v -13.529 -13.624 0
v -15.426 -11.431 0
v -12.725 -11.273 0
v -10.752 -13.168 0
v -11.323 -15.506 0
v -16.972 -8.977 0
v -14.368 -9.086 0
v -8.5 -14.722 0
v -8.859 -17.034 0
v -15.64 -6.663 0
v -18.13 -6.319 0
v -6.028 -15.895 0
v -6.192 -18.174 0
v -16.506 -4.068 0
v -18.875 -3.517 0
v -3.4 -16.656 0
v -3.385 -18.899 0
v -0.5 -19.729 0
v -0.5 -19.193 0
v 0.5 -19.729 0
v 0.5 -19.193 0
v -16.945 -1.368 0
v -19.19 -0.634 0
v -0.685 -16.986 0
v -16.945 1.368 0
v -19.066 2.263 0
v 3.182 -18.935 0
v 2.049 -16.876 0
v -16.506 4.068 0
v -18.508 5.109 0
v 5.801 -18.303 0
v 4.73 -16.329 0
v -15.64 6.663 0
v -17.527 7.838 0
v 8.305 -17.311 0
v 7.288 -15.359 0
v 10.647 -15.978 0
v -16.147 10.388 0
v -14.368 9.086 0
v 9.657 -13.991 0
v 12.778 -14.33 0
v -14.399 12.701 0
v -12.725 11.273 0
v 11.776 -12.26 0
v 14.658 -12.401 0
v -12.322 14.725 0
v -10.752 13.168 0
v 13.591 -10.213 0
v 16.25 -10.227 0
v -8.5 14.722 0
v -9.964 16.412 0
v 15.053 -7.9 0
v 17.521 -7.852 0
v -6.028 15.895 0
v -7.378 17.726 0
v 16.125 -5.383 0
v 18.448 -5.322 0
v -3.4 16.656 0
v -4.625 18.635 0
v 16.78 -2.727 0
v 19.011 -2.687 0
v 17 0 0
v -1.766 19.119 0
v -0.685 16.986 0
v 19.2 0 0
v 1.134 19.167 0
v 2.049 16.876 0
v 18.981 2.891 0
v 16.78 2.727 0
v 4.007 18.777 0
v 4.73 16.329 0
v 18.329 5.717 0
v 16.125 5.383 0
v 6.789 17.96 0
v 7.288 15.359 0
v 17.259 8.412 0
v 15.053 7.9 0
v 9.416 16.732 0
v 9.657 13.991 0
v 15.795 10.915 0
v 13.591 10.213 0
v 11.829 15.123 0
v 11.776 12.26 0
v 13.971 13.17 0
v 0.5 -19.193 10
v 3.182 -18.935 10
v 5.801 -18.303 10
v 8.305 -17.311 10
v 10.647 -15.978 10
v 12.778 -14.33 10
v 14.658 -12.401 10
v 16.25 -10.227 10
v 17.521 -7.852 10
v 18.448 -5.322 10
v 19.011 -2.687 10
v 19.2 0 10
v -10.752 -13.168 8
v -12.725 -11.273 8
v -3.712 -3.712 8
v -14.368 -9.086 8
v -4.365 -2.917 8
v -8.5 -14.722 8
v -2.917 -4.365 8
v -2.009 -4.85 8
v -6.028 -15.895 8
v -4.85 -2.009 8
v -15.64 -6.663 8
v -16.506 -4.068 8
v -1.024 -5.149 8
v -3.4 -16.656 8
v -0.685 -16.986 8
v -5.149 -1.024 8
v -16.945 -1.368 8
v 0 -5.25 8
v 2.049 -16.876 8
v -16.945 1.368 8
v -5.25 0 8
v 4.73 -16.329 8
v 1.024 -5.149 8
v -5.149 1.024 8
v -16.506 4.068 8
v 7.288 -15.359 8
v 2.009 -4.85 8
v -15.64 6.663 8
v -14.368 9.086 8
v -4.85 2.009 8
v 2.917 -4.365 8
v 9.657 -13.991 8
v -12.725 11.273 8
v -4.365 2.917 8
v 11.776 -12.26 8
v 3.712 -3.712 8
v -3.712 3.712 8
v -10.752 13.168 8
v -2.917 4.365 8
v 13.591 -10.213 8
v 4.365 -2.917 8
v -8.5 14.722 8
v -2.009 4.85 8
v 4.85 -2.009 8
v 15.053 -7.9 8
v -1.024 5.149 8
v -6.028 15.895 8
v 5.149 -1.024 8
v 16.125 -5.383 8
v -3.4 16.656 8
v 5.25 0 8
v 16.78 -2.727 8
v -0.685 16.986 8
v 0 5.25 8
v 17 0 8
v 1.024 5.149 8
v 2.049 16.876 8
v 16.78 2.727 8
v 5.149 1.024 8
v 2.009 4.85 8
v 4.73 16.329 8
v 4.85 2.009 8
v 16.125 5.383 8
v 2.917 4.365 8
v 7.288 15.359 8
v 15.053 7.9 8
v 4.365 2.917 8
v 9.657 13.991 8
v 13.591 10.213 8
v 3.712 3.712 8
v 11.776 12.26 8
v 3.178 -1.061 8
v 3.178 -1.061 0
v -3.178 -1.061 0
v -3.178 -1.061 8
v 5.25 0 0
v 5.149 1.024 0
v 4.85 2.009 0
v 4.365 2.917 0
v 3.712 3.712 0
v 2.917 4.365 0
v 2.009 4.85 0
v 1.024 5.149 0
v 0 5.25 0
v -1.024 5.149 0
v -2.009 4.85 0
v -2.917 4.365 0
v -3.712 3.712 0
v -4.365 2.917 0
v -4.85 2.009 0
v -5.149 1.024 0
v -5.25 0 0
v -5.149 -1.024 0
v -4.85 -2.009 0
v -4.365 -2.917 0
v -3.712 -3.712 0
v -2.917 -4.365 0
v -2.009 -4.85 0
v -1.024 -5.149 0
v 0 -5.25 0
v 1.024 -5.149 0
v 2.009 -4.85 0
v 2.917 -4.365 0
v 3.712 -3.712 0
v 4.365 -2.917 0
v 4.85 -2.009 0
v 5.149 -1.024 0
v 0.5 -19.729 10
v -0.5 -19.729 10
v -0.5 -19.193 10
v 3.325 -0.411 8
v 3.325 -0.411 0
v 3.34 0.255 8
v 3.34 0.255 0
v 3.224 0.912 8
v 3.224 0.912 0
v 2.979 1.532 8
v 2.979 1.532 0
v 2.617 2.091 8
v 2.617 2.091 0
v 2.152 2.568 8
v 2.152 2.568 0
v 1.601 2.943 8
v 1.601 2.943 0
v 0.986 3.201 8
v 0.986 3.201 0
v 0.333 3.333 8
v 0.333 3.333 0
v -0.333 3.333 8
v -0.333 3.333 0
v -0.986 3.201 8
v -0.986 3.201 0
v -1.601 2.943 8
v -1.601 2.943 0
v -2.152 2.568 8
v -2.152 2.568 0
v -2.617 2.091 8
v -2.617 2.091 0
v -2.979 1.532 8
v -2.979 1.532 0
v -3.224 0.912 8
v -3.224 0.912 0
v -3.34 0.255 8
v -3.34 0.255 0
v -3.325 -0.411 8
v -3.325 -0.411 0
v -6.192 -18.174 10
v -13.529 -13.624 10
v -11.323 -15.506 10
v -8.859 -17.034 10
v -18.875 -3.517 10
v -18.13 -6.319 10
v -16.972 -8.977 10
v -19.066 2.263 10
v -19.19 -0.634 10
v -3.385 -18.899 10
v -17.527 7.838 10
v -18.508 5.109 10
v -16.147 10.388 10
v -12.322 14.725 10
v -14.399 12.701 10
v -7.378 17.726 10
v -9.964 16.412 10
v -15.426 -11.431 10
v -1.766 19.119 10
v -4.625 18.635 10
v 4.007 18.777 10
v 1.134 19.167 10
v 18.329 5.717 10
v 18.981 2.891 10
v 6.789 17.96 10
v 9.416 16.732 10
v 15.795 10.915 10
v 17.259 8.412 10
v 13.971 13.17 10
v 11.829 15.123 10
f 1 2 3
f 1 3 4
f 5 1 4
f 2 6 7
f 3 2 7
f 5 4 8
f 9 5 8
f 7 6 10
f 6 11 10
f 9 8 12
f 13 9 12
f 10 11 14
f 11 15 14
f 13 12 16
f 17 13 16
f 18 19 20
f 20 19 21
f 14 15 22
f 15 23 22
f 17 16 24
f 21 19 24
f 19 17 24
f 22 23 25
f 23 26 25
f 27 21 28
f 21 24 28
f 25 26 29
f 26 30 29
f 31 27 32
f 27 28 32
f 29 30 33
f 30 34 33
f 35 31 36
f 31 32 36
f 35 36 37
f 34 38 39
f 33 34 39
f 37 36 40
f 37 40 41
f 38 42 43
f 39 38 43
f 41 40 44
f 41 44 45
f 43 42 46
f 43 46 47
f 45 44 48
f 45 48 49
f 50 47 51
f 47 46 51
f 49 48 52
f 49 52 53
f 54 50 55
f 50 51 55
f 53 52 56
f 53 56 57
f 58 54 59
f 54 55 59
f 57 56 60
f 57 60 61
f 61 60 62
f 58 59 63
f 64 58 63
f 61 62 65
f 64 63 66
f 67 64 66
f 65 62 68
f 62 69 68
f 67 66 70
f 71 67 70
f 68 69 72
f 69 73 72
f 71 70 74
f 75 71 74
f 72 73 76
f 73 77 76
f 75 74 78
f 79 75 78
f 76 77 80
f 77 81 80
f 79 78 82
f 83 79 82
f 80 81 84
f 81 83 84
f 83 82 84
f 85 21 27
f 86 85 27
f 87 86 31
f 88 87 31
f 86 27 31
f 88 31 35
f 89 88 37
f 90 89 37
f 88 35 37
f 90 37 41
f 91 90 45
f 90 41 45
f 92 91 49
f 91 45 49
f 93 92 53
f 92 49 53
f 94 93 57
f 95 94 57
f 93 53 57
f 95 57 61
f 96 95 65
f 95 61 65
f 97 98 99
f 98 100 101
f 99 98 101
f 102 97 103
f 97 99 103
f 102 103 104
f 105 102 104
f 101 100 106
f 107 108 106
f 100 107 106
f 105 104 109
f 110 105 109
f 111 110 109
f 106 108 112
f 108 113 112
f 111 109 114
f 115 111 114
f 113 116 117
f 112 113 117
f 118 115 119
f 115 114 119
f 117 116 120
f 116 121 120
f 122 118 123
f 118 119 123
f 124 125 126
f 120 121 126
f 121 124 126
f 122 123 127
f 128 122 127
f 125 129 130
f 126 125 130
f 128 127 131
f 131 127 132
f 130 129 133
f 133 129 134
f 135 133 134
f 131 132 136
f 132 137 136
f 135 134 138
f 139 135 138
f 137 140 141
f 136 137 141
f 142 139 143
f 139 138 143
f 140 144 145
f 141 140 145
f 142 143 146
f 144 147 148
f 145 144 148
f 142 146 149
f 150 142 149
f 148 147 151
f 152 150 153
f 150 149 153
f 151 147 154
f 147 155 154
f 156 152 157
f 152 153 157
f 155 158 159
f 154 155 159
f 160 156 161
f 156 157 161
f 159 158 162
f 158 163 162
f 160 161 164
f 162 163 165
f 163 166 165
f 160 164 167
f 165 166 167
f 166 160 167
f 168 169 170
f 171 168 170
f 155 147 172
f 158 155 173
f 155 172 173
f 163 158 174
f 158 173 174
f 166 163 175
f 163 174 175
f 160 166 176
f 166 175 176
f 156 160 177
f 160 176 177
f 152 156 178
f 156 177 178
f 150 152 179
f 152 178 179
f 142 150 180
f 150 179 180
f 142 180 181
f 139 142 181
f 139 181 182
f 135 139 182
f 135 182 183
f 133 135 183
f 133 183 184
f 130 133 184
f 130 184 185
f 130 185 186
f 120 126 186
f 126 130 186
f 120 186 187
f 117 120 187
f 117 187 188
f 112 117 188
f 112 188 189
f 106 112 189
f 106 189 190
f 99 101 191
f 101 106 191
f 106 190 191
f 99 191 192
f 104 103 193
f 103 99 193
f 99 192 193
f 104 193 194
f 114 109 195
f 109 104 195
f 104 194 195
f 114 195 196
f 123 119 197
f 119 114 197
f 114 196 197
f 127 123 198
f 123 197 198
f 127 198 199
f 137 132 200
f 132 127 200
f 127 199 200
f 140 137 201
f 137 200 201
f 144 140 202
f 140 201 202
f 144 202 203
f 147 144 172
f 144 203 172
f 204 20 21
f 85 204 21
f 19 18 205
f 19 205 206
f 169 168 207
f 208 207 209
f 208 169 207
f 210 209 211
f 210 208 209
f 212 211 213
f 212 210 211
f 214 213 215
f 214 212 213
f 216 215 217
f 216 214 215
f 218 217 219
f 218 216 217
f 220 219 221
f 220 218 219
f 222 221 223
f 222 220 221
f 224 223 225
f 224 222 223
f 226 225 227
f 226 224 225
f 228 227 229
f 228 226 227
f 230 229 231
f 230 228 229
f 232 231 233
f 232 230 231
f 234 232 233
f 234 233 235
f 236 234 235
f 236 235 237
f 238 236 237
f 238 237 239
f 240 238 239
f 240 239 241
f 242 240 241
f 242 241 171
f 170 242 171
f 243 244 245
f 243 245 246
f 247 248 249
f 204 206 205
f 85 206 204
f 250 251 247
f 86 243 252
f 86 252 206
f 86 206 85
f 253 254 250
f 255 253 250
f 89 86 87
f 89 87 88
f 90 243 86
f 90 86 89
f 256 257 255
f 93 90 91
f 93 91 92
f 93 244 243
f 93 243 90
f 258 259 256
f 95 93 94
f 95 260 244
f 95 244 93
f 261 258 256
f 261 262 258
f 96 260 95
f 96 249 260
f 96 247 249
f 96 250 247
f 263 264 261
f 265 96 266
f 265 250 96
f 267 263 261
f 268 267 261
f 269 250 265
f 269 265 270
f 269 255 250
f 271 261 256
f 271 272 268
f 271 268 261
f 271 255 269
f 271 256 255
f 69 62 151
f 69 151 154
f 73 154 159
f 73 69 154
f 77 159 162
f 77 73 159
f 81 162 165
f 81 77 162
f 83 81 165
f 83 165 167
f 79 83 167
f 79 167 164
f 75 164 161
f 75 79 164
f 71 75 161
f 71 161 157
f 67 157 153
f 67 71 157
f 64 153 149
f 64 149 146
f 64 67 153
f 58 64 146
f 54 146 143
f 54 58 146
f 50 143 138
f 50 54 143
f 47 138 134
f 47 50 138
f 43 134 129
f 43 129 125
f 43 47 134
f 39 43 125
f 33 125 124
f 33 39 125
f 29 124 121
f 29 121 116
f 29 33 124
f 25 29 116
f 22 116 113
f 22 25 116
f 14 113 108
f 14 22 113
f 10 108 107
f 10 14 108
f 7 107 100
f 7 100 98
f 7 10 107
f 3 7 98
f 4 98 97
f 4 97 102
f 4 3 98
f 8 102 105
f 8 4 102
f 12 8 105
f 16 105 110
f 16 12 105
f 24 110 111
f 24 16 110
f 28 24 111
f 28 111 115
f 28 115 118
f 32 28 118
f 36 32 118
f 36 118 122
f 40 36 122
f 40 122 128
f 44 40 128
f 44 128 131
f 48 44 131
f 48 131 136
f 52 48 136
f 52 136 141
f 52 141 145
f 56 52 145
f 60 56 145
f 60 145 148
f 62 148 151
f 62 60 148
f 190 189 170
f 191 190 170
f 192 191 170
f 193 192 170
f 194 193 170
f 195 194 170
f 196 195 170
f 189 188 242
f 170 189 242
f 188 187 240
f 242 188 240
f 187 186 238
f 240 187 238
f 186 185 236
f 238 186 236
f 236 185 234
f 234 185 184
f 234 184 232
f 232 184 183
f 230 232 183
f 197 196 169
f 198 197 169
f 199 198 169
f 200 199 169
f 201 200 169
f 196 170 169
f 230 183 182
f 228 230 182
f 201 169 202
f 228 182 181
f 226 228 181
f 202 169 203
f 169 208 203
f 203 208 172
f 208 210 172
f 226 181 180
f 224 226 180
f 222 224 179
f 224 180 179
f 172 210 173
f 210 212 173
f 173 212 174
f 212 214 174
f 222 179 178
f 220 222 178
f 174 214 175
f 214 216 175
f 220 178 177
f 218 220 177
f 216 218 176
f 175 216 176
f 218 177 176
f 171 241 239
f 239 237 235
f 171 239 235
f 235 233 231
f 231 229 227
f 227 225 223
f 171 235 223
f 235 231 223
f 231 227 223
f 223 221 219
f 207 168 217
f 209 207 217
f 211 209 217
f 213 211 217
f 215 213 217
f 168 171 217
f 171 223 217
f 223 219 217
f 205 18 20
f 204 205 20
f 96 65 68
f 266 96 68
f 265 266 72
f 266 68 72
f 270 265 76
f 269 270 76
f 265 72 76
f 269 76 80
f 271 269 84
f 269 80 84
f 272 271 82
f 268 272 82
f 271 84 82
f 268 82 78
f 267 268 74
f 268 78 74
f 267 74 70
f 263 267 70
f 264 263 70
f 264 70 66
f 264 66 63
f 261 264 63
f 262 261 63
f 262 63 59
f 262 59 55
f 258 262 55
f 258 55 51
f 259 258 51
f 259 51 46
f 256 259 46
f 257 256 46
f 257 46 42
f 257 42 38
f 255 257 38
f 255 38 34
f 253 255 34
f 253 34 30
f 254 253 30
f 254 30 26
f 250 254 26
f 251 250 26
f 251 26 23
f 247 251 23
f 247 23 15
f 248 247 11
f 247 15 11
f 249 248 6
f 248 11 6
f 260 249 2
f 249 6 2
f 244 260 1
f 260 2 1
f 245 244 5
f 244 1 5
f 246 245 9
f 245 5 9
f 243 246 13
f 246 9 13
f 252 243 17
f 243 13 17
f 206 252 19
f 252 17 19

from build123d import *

# Parameters (mm, degrees)
F0_R     = 19.2
F1_DEPTH = 10
F2_R     = 17
F3_DEPTH = 8
F4_R     = 5.25
F4_R_2   = 3.35
F5_DEPTH = 10
F7_DEPTH = 9
F8_W     = 1
F8_H     = 1
F9_DEPTH = 10


with BuildPart() as f1:
    # F0 (on Top) → F1 (new body)
    with BuildSketch(Plane.XY):
        Circle(F0_R)
    extrude(amount=F1_DEPTH)

    # F2 (on Top) → F3 (cut)
    with BuildSketch(Plane.XY):
        Circle(F2_R)
    extrude(amount=F3_DEPTH, mode=Mode.SUBTRACT)

    # F4 (on Top) → F5 (join)
    with BuildSketch(Plane.XY):
        Circle(F4_R)
        Circle(F4_R_2, mode=Mode.SUBTRACT)
    extrude(amount=F5_DEPTH)

    # F6 (on Top) → F7 (join)
    with BuildSketch(Plane.XY):
        with BuildLine():
            Line((4.017093, -1.060893), (-3.993784, -1.060893))
            ThreePointArc((-3.993784, -1.060893), (0.011655, -3.969964), (4.017093, -1.060893))
        make_face()
    extrude(amount=F7_DEPTH)

    # F8 (on Top) → F9 (join)
    with BuildSketch(Plane.XY):
        with Locations((0, -19.229485)):
            Rectangle(F8_W, F8_H)
    extrude(amount=F9_DEPTH)


solid = f1.part
